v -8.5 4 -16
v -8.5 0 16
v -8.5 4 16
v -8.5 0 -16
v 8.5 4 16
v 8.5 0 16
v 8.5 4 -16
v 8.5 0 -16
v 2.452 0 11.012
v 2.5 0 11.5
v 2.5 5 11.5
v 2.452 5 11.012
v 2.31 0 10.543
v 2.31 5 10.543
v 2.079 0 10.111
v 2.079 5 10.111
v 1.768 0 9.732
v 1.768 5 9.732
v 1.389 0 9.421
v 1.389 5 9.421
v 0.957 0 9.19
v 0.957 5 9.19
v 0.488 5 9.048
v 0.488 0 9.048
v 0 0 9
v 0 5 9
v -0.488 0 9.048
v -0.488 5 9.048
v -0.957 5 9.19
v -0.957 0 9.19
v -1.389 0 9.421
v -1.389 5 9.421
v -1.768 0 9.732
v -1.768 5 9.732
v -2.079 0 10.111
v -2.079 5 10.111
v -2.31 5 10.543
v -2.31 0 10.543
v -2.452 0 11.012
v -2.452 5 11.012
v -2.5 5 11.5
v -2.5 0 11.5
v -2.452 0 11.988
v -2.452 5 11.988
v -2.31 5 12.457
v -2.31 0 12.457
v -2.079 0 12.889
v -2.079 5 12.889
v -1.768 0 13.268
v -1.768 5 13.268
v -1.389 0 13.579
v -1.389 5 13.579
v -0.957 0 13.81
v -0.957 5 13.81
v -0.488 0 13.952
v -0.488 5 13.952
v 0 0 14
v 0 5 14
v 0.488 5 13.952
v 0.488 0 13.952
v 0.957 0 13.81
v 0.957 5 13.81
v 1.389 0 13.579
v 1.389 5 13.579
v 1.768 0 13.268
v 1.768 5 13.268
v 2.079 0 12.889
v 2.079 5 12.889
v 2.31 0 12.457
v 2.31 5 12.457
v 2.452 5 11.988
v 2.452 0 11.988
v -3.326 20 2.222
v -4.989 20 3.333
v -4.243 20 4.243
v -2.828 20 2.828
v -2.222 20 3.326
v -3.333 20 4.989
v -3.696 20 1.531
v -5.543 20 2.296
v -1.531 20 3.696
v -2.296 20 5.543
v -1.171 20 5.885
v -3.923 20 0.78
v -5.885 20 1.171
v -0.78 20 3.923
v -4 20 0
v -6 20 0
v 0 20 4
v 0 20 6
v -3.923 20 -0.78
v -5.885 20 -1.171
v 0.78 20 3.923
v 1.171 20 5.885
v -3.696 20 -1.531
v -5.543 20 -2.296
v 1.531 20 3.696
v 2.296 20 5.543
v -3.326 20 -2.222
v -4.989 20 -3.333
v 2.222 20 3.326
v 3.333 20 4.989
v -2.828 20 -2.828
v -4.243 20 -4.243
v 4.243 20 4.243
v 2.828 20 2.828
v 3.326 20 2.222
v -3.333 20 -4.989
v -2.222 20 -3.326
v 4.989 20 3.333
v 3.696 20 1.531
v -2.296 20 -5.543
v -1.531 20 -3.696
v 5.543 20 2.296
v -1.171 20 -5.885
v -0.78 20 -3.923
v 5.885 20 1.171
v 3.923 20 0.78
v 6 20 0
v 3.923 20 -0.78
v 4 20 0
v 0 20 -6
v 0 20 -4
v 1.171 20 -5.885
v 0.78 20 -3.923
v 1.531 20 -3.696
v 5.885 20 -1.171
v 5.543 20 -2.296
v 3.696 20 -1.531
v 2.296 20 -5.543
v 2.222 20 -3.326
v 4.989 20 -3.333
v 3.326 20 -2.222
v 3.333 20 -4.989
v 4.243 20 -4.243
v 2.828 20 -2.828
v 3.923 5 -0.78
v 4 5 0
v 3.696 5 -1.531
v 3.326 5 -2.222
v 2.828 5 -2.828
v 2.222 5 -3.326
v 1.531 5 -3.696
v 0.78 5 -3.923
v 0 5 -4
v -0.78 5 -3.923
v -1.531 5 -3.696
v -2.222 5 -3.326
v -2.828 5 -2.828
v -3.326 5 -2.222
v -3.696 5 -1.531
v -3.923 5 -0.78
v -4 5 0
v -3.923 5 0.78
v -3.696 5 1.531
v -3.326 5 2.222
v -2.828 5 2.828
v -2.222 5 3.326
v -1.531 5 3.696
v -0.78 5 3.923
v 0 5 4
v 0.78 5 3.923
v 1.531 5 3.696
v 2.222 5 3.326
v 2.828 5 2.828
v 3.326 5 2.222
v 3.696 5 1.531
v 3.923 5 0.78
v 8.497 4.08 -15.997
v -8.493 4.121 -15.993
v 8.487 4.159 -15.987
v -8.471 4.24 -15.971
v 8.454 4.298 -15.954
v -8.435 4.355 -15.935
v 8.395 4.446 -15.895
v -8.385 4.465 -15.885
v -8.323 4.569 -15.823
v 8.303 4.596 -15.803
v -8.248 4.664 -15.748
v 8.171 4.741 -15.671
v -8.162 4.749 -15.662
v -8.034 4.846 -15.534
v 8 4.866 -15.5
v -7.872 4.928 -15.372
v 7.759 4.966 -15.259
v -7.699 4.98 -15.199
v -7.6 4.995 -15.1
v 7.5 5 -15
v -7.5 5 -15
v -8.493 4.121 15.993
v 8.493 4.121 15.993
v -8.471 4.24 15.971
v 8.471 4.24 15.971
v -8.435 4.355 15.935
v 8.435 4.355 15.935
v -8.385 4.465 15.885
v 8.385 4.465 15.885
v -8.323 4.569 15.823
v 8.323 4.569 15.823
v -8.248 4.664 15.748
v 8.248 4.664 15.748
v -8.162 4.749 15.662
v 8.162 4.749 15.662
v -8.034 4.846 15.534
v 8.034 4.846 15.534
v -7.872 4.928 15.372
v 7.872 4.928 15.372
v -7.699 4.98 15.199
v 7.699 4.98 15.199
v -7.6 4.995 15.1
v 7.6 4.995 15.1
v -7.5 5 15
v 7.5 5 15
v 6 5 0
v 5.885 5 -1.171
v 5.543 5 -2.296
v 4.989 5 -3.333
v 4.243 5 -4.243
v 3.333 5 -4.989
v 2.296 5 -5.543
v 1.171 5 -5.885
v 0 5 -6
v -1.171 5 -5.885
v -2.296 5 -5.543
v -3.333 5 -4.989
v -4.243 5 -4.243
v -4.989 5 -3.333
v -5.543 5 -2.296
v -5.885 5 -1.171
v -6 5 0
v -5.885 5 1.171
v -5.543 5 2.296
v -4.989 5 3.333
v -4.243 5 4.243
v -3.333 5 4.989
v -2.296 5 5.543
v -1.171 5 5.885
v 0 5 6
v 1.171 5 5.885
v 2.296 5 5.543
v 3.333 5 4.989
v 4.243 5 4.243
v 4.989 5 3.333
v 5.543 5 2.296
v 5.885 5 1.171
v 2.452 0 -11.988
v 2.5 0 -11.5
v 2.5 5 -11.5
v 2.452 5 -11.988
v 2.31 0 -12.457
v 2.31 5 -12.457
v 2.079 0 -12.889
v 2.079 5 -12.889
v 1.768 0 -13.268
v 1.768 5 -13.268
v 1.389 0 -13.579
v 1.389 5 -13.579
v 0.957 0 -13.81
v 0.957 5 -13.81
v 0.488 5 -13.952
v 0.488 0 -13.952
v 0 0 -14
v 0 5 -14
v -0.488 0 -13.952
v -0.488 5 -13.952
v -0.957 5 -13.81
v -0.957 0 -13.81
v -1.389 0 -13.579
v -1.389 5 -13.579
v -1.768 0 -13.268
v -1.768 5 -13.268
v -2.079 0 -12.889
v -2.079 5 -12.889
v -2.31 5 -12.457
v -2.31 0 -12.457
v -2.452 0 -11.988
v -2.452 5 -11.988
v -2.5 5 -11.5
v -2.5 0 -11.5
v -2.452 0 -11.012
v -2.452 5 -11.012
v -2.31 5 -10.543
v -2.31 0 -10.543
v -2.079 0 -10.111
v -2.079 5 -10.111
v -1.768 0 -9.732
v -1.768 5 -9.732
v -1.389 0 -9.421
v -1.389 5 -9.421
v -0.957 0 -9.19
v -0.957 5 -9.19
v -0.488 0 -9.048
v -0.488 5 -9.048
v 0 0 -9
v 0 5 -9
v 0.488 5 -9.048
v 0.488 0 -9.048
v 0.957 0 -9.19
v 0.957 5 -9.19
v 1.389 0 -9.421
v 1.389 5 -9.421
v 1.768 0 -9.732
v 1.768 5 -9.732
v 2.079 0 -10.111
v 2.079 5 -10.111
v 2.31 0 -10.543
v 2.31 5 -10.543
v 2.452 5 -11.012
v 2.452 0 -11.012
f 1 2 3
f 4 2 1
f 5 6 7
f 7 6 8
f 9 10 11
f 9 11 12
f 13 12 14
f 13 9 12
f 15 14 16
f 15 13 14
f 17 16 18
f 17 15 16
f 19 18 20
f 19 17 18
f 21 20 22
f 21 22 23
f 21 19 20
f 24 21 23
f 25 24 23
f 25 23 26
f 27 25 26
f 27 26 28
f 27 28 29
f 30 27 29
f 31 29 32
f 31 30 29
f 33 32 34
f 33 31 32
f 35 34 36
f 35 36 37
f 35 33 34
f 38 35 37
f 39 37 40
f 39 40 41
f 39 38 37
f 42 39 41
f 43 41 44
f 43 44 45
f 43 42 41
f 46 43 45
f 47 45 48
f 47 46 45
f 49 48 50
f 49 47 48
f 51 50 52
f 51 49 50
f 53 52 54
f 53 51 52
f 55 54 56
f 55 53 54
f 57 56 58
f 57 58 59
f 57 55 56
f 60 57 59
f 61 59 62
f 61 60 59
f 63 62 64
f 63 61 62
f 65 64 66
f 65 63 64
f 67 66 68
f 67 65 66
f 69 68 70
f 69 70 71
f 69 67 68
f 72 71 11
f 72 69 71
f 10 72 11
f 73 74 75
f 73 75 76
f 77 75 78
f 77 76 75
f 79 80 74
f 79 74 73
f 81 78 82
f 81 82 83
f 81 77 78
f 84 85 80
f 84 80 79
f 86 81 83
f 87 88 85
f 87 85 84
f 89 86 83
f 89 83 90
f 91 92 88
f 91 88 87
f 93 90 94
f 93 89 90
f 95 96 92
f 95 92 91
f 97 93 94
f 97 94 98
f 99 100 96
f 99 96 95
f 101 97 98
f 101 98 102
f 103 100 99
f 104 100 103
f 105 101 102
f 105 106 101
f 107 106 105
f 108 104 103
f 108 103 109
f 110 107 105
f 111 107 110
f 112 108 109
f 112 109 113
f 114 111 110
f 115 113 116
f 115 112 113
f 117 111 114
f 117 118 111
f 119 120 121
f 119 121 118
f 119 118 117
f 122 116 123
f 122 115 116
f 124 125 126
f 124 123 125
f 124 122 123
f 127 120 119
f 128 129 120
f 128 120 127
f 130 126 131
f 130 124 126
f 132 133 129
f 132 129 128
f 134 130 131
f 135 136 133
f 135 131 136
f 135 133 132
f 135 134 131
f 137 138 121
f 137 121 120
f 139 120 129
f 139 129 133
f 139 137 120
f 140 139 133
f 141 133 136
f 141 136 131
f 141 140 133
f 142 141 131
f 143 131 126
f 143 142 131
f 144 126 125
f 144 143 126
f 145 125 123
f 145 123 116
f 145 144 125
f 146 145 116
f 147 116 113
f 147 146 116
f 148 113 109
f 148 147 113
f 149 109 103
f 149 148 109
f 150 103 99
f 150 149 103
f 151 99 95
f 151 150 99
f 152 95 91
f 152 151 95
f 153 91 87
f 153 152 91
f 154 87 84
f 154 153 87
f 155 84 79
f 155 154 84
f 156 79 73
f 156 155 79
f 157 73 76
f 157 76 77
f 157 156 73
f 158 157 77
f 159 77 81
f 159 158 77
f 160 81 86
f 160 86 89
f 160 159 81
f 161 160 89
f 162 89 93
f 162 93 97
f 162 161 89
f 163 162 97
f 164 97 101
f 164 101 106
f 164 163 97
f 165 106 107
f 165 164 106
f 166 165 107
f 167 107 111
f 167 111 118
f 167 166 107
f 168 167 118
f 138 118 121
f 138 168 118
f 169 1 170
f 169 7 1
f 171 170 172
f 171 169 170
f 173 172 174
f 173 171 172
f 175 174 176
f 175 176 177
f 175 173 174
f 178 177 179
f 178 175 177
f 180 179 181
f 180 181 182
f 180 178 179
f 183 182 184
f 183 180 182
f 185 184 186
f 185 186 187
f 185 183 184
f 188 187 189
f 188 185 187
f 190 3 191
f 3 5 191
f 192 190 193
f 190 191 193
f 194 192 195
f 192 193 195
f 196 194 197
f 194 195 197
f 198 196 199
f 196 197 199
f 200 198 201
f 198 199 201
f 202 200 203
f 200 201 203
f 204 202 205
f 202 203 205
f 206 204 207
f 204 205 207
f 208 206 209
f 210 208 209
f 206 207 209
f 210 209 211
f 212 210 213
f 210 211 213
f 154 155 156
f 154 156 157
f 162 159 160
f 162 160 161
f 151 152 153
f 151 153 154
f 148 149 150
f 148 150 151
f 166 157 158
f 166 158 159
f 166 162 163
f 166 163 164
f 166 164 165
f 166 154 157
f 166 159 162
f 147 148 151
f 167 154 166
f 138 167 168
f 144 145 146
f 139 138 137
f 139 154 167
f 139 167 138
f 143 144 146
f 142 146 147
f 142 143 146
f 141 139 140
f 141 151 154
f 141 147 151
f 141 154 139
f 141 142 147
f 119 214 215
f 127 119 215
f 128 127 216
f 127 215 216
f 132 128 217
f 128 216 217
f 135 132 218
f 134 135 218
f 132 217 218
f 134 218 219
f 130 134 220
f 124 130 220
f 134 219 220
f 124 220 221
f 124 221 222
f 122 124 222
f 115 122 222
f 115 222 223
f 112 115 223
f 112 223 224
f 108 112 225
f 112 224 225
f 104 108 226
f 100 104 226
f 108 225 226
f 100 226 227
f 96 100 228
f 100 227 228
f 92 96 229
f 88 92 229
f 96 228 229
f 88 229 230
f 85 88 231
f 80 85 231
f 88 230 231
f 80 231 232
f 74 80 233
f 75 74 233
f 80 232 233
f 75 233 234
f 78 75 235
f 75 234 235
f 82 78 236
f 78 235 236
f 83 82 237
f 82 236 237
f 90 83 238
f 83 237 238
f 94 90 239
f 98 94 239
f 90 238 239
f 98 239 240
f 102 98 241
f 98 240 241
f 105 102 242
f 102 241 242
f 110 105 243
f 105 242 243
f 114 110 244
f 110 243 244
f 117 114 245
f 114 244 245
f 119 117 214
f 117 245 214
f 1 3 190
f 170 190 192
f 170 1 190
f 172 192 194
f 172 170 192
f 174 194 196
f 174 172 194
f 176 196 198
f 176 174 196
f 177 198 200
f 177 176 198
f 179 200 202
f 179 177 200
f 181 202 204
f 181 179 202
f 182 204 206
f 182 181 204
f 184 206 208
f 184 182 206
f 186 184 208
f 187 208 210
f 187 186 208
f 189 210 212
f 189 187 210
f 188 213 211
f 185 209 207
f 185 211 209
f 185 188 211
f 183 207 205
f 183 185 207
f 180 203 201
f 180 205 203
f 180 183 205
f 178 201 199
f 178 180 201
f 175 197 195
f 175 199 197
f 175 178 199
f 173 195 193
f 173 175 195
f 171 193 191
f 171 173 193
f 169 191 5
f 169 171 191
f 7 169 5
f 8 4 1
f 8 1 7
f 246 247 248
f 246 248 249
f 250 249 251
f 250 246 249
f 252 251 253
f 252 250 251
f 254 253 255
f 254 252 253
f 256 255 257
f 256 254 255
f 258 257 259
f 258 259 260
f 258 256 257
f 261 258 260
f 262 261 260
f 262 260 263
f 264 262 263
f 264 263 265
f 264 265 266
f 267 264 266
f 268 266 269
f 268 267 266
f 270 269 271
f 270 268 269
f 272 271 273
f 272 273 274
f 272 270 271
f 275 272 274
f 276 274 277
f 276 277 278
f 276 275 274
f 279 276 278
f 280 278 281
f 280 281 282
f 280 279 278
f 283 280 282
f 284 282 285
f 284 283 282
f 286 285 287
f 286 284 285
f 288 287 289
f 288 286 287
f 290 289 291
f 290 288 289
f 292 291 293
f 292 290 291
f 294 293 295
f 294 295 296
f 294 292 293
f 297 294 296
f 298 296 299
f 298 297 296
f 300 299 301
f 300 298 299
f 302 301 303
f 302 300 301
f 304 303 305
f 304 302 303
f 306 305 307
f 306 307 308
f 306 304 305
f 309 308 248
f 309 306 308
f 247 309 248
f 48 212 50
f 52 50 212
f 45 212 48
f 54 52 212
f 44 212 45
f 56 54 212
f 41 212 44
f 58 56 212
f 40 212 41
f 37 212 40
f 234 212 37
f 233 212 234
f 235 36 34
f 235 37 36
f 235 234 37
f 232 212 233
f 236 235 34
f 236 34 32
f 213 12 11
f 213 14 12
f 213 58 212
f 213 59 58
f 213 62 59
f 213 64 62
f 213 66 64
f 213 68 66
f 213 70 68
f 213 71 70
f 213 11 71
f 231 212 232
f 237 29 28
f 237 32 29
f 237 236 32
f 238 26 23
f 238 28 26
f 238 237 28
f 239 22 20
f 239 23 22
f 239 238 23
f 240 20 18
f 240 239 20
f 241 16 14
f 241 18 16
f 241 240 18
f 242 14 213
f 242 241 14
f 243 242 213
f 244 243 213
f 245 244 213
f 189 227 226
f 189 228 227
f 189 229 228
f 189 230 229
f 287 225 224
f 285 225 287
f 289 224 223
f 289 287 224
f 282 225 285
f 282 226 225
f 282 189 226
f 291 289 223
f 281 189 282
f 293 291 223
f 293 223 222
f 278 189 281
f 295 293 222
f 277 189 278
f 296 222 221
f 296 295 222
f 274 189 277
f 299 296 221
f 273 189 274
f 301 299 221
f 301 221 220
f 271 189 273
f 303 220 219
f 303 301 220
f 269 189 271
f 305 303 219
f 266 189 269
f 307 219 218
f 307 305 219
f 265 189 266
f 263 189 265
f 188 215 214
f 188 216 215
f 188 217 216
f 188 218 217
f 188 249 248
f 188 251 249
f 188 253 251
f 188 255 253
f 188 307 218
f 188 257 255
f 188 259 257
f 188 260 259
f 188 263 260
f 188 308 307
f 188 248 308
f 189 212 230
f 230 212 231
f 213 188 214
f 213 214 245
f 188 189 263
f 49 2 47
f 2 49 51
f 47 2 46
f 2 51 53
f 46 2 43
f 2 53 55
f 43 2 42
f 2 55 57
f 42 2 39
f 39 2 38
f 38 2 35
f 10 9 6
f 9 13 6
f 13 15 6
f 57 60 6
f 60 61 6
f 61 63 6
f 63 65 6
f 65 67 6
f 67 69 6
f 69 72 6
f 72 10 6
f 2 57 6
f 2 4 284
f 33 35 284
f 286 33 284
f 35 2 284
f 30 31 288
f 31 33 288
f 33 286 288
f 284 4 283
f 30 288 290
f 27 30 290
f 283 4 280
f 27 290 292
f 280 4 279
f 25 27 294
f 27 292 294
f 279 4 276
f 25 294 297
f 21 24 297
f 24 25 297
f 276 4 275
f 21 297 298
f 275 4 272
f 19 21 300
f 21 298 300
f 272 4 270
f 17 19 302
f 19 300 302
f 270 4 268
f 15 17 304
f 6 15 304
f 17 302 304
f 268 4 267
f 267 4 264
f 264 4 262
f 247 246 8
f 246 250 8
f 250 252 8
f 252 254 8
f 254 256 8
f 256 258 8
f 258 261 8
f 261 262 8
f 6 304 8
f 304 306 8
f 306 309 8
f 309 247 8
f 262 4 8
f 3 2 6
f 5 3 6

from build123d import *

# Parameters (mm, degrees)
SKETCH1_W           = 17
SKETCH1_H           = 32
SKETCH1_R           = 2.5
BOSS_EXTRUDE1_DEPTH = 5
SKETCH2_R           = 6
SKETCH2_R_2         = 4
BOSS_EXTRUDE2_DEPTH = 15
FILLET1_R           = 1


with BuildPart() as part:
    # Sketch1 → Boss-Extrude1 (new body)
    with BuildSketch(Plane(origin=(0, 0, 0), x_dir=(1, 0, 0), z_dir=(0, 1, 0))):
        Rectangle(SKETCH1_W, SKETCH1_H)
        with Locations((0, 11.5)):
            Circle(SKETCH1_R, mode=Mode.SUBTRACT)
        with Locations((0, -11.5)):
            Circle(SKETCH1_R, mode=Mode.SUBTRACT)
    extrude(amount=BOSS_EXTRUDE1_DEPTH)

    # Sketch2 → Boss-Extrude2 (add)
    with BuildSketch(Plane(origin=(0, 5, 0), x_dir=(1, 0, 0), z_dir=(0, 1, 0))):
        Circle(SKETCH2_R)
        Circle(SKETCH2_R_2, mode=Mode.SUBTRACT)
    extrude(amount=BOSS_EXTRUDE2_DEPTH)

    # Fillet1
    fillet1_edges = [part.edges().sort_by_distance(p)[0] for p in [
        (-8.5, 5, 0),
        (0, 5, 16),
        (8.5, 5, 0),
        (0, 5, -16),
    ]]
    fillet(fillet1_edges, radius=FILLET1_R)


solid = part.part
